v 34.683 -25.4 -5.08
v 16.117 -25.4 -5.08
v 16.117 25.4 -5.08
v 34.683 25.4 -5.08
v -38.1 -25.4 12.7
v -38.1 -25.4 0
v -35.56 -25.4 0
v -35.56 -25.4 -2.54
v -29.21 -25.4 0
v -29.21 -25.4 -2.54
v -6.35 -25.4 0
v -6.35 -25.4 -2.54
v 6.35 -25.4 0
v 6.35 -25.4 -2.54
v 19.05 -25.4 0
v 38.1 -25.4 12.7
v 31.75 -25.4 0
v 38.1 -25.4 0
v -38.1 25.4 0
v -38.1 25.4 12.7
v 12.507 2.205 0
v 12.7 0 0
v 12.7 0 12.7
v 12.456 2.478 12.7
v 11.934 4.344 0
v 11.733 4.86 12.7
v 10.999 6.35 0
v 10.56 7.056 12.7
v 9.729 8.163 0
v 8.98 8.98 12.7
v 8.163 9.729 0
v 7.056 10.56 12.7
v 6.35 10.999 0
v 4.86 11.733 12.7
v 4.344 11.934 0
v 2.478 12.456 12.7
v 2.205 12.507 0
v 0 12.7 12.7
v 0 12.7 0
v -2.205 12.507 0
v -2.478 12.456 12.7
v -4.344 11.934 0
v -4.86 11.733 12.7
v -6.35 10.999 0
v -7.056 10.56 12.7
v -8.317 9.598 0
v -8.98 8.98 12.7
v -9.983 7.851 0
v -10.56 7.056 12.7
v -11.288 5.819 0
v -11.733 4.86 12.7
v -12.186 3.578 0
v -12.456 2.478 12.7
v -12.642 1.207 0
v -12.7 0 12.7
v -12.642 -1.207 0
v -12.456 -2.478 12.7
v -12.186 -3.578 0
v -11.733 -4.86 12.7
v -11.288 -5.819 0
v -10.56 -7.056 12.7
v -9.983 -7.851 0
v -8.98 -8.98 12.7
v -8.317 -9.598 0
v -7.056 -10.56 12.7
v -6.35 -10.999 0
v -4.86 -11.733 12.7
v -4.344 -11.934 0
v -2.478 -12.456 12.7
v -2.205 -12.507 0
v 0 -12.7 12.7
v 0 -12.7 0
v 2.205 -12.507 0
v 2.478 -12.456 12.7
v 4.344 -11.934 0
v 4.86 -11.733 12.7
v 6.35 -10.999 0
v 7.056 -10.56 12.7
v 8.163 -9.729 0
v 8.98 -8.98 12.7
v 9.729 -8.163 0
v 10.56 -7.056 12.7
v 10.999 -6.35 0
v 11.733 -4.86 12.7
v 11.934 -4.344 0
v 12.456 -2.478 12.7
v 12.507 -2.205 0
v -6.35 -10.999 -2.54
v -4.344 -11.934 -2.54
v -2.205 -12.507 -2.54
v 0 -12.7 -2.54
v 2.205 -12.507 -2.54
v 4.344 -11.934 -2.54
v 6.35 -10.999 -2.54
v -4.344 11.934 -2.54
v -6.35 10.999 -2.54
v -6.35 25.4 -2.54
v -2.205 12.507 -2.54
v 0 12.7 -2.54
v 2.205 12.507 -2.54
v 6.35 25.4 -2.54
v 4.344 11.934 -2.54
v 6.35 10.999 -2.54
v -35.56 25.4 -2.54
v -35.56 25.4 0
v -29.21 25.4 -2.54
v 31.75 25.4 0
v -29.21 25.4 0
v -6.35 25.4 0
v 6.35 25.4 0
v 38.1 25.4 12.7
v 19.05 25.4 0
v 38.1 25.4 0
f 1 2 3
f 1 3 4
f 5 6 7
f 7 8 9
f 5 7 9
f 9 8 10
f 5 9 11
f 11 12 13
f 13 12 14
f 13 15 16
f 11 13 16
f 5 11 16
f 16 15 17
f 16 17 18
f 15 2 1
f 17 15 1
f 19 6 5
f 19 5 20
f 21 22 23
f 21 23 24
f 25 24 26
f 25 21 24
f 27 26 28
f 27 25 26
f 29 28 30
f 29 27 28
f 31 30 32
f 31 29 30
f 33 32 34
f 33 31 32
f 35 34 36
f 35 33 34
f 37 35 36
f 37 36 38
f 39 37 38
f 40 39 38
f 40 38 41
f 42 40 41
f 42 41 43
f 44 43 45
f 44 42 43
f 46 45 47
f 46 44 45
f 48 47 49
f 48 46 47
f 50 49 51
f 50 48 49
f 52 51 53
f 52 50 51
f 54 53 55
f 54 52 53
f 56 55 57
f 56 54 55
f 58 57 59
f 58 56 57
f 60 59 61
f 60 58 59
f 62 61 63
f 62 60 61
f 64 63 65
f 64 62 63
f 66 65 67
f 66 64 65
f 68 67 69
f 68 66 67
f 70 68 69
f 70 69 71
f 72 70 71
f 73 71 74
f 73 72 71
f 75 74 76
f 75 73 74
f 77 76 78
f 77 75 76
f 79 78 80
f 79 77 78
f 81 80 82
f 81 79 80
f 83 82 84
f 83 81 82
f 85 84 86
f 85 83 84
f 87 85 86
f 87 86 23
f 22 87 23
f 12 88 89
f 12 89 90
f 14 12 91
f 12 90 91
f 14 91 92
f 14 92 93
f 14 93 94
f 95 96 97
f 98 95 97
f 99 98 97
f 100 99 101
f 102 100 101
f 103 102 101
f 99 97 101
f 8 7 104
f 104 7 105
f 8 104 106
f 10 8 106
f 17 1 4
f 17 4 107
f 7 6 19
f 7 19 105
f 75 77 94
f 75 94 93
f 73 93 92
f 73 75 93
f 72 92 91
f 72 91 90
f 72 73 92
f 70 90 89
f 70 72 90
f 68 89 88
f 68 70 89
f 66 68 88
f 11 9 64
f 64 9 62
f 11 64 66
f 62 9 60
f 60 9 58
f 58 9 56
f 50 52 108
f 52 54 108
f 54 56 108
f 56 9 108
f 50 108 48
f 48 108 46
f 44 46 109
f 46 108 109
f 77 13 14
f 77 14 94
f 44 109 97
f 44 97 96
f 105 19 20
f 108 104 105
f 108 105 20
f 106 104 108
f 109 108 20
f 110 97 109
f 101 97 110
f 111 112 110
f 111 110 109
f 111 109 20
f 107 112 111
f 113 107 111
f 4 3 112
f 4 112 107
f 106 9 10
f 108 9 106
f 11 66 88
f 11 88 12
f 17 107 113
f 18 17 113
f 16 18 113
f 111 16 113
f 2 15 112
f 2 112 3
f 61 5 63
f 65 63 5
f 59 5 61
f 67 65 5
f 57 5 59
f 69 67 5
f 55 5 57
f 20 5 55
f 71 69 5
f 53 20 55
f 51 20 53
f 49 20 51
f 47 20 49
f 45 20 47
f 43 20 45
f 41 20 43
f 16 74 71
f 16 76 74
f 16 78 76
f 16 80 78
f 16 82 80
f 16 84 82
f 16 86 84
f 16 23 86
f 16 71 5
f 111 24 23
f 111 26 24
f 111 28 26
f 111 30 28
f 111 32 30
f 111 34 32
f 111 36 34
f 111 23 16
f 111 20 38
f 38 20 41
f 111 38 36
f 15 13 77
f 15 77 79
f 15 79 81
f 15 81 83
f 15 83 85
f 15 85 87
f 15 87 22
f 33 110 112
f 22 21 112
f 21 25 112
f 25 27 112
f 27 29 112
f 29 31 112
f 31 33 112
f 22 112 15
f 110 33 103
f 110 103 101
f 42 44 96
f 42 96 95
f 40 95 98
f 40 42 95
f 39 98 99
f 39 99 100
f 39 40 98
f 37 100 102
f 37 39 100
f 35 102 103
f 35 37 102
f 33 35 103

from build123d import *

# Parameters (mm, degrees)
F0_W     = 76.2
F0_H     = 50.8
F0_R     = 12.7
F1_DEPTH = 12.7
F2_W     = 6.35
F2_H     = 50.8
F3_DEPTH = 15.24
F5_DEPTH = 50.8


with BuildPart() as f1:
    # F0 (on Top) → F1 (new body)
    with BuildSketch(Plane.XY):
        Rectangle(F0_W, F0_H)
        Circle(F0_R, mode=Mode.SUBTRACT)
    extrude(amount=F1_DEPTH)

    # F2 (on face) → F3 (join)
    with BuildSketch(Plane.XY.offset(12.7)):
        with Locations((-32.385, 0)):
            Rectangle(F2_W, F2_H)
        with BuildLine():
            Line((-6.35, -10.998523), (-6.35, -25.4))
            Line((-6.35, -25.4), (6.35, -25.4))
            Line((6.35, -25.4), (6.35, -10.998523))
            ThreePointArc((6.35, -10.998523), (0, -12.7), (-6.35, -10.998523))
        make_face()
        with BuildLine():
            Line((6.35, 25.4), (-6.35, 25.4))
            Line((-6.35, 25.4), (-6.35, 10.998523))
            ThreePointArc((-6.35, 10.998523), (0, 12.7), (6.35, 10.998523))
            Line((6.35, 10.998523), (6.35, 25.4))
        make_face()
    extrude(amount=-F3_DEPTH)

    # F4 (on face) → F5 (join)
    with BuildSketch(Plane.XZ.offset(25.4)):
        Polygon((31.75, 0), (19.05, 0), (16.117061, -5.08), (34.682939, -5.08), align=None)
    extrude(amount=-F5_DEPTH)


solid = f1.part
